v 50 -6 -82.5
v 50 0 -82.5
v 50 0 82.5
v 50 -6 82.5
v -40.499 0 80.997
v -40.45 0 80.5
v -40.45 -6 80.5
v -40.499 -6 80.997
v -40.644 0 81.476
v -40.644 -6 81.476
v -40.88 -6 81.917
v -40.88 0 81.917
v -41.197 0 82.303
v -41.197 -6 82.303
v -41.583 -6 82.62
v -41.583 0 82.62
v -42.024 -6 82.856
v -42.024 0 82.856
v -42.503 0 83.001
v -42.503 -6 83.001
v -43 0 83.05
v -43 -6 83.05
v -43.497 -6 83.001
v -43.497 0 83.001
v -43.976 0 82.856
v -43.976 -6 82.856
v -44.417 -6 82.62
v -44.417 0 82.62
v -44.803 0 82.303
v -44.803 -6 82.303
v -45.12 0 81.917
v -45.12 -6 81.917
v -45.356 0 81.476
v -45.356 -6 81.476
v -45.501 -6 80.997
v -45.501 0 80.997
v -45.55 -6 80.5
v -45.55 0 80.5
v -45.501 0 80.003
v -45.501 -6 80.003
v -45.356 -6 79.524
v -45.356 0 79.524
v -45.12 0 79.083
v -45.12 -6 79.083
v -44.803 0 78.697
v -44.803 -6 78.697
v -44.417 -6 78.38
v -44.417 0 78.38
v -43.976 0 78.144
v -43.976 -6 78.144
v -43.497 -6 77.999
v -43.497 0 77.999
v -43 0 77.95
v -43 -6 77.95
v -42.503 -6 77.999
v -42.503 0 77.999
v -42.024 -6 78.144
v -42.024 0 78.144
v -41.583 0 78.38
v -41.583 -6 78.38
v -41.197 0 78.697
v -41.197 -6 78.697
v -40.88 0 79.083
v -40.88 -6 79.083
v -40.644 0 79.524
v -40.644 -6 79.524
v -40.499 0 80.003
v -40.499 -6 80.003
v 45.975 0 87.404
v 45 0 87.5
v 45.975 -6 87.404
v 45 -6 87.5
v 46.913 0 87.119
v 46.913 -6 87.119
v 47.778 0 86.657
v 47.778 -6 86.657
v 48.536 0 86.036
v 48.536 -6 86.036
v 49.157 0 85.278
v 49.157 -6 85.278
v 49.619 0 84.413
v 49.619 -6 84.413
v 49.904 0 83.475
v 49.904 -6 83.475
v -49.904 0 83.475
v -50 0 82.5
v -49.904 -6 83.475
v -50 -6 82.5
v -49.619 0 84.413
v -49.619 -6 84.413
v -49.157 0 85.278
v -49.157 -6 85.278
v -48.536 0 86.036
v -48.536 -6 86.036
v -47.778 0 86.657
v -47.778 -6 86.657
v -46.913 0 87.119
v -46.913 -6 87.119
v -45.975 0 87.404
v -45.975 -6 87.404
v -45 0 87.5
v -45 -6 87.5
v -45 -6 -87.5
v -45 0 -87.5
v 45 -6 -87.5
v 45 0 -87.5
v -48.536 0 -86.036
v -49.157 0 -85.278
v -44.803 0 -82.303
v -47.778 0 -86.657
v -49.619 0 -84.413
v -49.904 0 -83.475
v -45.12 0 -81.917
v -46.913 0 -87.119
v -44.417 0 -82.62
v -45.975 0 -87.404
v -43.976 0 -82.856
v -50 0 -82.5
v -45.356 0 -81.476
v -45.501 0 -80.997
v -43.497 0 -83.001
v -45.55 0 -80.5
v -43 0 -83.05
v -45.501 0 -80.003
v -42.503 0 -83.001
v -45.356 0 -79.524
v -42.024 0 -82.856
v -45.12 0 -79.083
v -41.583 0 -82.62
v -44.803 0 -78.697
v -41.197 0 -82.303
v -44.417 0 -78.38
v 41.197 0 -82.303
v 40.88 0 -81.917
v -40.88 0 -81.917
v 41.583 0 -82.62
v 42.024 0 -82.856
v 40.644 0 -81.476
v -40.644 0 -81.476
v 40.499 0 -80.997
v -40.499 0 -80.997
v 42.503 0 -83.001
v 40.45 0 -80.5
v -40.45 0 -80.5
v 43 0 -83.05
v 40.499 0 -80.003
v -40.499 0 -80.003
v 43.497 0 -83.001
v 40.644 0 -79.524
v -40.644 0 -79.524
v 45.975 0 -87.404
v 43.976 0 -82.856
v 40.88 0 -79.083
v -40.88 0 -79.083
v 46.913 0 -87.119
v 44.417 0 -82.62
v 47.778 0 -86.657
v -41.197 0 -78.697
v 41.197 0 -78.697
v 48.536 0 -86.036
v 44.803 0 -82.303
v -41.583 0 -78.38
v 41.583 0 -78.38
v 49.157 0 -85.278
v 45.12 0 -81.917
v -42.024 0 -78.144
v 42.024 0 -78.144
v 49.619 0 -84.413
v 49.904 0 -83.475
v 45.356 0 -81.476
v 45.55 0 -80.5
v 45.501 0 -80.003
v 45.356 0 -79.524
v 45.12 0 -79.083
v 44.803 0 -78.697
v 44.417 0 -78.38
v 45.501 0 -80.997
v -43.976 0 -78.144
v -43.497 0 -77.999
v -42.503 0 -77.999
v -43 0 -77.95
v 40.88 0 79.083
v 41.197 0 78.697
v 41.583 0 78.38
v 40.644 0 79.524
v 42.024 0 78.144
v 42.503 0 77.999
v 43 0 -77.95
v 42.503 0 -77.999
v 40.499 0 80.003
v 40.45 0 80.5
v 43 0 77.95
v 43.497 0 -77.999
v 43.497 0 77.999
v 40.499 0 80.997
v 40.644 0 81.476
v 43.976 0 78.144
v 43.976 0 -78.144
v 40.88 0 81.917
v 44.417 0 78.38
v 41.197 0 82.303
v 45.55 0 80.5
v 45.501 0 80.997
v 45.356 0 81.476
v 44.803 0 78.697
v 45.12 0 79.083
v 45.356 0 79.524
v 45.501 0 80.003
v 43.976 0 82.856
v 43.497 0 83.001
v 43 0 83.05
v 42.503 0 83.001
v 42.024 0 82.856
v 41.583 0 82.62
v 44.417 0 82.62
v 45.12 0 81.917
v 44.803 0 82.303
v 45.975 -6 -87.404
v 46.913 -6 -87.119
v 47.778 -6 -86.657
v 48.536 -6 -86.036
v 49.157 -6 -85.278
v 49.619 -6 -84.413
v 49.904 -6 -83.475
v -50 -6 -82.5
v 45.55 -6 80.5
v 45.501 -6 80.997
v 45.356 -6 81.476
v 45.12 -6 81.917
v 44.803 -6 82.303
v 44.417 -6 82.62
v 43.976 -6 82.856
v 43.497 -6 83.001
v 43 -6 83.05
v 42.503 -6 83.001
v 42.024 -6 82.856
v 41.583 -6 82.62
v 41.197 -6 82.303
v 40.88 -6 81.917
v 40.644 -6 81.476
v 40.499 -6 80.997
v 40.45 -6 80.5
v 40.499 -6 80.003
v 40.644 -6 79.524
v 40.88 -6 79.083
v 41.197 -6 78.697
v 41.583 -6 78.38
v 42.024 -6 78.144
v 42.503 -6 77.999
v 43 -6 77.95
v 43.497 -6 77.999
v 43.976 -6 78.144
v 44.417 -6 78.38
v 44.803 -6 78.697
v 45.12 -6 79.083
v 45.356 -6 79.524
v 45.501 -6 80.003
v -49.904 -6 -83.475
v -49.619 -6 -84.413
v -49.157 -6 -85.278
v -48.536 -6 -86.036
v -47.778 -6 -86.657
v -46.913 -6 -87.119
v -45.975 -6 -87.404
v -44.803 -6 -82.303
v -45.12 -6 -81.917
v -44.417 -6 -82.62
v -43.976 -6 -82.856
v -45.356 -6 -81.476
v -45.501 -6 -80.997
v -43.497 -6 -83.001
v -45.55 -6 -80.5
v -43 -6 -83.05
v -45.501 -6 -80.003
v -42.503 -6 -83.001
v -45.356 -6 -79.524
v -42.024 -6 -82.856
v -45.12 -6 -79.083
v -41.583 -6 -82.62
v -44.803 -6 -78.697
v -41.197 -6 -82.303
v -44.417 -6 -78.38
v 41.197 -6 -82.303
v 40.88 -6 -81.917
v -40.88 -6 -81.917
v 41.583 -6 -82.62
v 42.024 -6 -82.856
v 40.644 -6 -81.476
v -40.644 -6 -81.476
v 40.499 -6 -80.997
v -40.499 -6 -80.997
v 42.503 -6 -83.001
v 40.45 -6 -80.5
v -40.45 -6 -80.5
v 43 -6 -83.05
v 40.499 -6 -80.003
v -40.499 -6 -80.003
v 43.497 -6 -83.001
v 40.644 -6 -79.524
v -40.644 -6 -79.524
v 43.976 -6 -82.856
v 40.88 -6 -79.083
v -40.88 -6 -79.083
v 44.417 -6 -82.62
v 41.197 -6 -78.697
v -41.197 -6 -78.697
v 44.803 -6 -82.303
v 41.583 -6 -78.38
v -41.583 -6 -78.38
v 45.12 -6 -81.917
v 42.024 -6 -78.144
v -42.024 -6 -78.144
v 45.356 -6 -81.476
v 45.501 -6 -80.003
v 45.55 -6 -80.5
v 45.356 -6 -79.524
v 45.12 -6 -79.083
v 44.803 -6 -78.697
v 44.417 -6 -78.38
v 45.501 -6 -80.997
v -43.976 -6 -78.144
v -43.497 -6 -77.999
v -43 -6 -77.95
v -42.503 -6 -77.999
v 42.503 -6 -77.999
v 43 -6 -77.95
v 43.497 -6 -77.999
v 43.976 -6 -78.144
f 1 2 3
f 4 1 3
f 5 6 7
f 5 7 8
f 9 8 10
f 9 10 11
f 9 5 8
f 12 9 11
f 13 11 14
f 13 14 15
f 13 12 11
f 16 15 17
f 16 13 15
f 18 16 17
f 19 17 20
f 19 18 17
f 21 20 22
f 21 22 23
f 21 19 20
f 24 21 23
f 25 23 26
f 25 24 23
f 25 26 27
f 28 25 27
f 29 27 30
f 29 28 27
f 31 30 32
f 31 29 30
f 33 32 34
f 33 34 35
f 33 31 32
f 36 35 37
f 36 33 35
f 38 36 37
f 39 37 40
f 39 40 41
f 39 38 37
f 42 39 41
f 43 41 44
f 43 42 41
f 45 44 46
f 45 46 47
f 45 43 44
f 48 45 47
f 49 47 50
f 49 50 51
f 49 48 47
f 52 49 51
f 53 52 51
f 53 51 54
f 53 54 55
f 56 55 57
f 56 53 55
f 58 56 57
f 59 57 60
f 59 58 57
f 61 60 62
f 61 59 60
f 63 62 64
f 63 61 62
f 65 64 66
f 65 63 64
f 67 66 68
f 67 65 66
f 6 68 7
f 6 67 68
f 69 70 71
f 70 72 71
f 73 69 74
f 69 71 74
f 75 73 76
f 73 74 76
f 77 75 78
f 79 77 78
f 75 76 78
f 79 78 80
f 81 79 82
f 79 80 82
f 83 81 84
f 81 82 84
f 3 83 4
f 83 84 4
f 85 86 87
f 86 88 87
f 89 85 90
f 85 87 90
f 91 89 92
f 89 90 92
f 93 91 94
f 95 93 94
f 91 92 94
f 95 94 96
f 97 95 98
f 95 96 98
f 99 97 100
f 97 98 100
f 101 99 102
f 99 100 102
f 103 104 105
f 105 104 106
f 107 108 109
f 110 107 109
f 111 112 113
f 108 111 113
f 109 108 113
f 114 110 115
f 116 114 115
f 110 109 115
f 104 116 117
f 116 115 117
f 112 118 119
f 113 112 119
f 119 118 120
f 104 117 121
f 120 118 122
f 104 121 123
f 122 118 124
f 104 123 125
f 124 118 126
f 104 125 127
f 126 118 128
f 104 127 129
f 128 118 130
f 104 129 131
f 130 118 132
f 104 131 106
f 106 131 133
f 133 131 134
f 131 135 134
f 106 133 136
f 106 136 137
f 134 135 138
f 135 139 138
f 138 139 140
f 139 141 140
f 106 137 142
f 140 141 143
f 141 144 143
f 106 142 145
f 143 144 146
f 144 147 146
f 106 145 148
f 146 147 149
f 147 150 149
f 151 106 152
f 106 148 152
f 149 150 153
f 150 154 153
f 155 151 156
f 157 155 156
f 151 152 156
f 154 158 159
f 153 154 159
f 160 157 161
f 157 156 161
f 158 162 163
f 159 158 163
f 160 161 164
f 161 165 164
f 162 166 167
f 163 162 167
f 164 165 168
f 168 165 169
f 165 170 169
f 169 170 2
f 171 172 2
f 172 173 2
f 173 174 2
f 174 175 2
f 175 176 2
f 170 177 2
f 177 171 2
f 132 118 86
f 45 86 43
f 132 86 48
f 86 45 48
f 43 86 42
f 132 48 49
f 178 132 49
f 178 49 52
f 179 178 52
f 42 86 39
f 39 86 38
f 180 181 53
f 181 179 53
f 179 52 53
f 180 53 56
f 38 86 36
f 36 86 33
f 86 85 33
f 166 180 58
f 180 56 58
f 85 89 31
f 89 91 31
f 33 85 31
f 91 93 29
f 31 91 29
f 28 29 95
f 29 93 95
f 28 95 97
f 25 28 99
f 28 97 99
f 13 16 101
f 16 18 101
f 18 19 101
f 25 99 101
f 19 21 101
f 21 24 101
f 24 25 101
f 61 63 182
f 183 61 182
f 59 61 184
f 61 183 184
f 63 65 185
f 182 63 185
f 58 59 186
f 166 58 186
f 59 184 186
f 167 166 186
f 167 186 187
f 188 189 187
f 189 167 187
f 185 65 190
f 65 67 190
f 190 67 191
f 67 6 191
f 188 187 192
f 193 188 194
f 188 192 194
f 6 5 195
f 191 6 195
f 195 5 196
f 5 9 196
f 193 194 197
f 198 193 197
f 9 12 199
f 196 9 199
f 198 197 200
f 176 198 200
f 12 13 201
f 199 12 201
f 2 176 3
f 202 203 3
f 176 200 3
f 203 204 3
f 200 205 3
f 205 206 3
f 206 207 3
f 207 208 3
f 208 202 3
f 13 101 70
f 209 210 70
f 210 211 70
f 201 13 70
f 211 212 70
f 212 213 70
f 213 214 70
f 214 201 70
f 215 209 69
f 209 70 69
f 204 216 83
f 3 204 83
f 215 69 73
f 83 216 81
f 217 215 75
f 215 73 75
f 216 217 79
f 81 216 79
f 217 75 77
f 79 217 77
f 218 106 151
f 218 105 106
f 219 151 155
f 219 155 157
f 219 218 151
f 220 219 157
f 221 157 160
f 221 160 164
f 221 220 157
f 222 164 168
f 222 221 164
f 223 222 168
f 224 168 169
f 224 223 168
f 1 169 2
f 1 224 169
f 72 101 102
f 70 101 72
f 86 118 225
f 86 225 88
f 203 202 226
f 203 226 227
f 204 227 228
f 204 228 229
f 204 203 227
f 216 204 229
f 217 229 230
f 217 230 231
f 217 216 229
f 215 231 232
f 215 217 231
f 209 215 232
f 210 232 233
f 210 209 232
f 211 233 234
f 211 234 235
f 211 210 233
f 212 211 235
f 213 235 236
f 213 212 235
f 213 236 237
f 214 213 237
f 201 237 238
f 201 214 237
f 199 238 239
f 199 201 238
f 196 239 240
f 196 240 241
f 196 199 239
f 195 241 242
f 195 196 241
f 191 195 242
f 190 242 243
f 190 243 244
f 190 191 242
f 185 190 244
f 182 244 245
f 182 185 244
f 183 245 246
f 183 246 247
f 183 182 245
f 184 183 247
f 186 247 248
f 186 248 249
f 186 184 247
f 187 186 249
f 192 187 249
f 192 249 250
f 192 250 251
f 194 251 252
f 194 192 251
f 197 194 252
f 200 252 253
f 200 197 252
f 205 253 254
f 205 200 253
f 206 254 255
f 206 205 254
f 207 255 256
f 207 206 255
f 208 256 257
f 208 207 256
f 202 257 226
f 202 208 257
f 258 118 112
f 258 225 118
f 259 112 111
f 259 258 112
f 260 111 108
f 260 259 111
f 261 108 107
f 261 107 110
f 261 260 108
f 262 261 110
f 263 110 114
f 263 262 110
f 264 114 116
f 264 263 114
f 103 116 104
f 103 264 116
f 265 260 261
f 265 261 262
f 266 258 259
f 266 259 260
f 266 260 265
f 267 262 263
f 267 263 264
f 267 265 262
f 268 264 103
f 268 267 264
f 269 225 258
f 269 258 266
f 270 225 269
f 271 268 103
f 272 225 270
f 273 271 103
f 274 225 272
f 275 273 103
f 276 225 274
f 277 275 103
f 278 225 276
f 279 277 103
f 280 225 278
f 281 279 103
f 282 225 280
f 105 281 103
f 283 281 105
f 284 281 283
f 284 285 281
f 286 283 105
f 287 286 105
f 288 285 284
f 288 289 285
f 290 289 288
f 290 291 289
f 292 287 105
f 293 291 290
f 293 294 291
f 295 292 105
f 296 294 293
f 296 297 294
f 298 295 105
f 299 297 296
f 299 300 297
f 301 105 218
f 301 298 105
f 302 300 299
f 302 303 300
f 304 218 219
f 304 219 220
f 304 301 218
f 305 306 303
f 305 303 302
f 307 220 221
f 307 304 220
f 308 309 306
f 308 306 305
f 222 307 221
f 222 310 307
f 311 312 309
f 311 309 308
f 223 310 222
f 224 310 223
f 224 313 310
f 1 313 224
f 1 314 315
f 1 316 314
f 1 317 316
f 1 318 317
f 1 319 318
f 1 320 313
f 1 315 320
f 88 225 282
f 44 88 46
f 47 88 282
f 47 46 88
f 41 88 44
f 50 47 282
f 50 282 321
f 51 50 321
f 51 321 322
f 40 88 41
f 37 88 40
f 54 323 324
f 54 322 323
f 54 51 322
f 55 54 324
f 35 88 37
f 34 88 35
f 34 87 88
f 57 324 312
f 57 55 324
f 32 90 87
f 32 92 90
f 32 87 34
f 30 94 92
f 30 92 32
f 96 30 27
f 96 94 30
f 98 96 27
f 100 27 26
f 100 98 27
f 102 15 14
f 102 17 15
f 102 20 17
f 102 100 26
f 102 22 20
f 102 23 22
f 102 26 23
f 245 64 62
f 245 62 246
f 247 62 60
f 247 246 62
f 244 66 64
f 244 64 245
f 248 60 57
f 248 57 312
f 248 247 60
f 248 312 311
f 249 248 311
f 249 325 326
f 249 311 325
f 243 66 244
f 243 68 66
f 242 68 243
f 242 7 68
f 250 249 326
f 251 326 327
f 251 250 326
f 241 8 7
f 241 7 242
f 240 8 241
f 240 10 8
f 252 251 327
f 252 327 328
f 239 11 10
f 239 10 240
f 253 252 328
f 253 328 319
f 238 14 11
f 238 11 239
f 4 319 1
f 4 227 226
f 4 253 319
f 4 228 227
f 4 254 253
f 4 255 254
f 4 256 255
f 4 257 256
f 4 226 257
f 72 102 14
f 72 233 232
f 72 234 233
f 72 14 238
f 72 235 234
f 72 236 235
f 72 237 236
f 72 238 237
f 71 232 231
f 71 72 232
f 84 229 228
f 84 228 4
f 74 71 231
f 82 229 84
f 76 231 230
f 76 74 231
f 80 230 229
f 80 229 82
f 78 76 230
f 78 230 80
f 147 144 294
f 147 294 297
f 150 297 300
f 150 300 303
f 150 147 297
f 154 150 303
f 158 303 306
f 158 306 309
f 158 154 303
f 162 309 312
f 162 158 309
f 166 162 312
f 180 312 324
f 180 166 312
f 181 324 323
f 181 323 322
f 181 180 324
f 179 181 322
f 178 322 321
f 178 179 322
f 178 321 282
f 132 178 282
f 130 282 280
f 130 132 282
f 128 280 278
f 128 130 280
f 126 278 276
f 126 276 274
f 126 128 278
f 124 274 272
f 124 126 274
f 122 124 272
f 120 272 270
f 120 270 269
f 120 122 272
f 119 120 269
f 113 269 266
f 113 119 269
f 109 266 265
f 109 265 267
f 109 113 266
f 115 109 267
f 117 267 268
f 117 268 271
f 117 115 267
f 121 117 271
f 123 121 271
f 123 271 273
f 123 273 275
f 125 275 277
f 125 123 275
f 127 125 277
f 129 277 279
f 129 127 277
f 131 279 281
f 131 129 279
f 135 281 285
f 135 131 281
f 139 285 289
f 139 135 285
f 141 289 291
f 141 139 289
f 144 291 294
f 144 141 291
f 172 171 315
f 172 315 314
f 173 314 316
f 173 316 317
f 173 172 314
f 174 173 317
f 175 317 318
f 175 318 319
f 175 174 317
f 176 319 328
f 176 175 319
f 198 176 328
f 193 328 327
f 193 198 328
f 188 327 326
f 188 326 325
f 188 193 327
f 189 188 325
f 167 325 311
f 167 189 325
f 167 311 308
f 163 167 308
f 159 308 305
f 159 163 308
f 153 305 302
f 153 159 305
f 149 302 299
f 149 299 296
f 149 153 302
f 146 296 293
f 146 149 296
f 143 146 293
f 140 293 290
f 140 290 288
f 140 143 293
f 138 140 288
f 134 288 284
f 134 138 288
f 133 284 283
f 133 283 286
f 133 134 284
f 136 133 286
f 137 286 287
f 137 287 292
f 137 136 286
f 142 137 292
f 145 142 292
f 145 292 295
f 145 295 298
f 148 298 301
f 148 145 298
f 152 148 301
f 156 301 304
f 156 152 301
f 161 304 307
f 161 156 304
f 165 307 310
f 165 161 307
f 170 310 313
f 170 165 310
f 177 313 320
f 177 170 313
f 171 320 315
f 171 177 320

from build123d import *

# Parameters (mm, degrees)
F0_W     = 100
F0_H     = 175
F0_R     = 2.55
F1_DEPTH = 6
F2_R     = 5


with BuildPart() as f1:
    # F0 (on Front) → F1 (new body)
    with BuildSketch(Plane.XZ):
        Rectangle(F0_W, F0_H)
        with Locations((-43, -80.5)):
            Circle(F0_R, mode=Mode.SUBTRACT)
        with Locations((43, -80.5)):
            Circle(F0_R, mode=Mode.SUBTRACT)
        with Locations((-43, 80.5)):
            Circle(F0_R, mode=Mode.SUBTRACT)
        with Locations((43, 80.5)):
            Circle(F0_R, mode=Mode.SUBTRACT)
    extrude(amount=F1_DEPTH)

    # F2
    f2_edges = [f1.edges().sort_by_distance(p)[0] for p in [
        (-50, -3, 87.5),
        (-50, -3, -87.5),
        (50, -3, 87.5),
        (50, -3, -87.5),
    ]]
    fillet(f2_edges, radius=F2_R)


solid = f1.part
